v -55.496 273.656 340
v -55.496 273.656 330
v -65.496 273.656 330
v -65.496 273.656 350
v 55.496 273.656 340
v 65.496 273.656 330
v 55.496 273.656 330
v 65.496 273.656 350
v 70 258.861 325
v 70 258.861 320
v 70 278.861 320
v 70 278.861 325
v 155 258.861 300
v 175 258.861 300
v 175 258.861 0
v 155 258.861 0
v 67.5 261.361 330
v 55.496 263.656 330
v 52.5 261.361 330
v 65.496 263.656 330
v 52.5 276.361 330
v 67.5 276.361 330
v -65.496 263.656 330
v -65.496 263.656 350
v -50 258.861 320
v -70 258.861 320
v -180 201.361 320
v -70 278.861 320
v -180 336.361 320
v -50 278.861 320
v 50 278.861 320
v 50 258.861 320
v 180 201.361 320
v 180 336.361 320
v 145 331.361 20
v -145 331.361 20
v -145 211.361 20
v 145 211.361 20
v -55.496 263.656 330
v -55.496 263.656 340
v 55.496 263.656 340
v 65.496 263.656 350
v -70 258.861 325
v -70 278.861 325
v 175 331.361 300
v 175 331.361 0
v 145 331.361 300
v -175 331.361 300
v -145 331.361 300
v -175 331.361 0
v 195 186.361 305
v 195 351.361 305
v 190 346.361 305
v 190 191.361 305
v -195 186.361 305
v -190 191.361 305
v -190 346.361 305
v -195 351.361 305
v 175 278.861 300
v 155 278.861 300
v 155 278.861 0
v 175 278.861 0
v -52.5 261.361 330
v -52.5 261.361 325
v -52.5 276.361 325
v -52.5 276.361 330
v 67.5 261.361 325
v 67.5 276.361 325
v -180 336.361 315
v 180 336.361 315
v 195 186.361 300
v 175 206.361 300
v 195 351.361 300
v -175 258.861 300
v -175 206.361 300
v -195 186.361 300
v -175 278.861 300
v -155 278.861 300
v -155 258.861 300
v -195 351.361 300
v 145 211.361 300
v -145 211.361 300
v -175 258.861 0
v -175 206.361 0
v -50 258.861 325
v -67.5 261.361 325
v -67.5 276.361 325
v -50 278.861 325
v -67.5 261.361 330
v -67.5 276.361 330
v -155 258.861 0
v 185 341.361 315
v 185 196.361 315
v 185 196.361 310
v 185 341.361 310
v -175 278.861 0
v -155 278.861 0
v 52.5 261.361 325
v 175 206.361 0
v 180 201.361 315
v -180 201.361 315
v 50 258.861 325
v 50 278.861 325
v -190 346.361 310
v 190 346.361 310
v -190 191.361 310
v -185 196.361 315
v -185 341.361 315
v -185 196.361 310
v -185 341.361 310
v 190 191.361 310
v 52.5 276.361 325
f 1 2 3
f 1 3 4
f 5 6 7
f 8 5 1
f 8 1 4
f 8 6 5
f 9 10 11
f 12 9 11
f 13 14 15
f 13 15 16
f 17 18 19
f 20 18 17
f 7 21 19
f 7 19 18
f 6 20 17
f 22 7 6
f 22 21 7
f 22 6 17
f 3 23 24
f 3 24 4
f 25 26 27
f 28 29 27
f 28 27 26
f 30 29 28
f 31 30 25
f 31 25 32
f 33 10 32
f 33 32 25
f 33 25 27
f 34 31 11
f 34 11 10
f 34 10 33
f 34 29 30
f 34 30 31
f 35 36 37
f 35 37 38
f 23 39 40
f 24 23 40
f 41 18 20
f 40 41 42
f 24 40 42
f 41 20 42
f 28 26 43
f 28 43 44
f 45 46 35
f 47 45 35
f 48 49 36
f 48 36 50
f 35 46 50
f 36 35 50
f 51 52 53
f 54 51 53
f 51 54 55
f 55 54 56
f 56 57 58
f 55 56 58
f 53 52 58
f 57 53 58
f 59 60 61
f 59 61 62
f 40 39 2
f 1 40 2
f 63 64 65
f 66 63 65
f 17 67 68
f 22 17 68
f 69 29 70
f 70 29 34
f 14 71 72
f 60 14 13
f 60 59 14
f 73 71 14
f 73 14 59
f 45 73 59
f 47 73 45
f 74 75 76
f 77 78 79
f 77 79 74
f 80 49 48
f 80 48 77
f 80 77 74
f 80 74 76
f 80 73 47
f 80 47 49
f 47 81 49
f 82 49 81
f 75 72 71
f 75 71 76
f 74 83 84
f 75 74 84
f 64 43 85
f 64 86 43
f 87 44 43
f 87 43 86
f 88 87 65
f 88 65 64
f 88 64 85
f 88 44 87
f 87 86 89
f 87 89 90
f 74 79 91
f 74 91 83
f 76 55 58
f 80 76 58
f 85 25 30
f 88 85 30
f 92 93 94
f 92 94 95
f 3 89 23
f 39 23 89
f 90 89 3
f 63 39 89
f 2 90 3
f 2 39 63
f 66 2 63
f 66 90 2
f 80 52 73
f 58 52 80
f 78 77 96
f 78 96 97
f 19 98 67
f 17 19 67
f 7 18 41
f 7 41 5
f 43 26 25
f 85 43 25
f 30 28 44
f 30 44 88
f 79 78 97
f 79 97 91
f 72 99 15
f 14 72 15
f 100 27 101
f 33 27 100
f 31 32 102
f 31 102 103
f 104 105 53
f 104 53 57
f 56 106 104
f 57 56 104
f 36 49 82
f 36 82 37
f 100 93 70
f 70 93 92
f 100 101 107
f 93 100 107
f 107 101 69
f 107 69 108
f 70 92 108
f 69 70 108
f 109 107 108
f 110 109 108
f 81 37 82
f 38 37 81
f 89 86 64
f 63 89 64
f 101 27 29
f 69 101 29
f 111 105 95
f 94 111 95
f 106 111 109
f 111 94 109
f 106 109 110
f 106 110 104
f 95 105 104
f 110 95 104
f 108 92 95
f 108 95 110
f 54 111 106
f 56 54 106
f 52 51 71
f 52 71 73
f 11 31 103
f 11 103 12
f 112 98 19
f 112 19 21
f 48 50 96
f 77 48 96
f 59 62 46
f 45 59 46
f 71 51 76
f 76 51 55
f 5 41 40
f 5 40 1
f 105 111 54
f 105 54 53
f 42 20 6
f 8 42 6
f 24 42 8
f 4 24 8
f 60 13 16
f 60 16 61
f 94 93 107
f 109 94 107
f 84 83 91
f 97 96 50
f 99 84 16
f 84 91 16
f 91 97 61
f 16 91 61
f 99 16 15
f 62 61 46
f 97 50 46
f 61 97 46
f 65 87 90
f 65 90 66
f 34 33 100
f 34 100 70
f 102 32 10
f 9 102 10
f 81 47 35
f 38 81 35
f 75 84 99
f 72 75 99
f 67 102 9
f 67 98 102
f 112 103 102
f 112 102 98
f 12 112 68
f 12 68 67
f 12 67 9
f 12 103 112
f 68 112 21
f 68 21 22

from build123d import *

# Parameters (mm, degrees)
BOSS_EXTRUDE1_DEPTH = 320
SKETCH2_W           = 20
SKETCH2_H           = 20
BOSS_EXTRUDE2_DEPTH = 5
SKETCH3_W           = 15
SKETCH3_H           = 15
BOSS_EXTRUDE3_DEPTH = 5
SKETCH4_W           = 10
SKETCH4_H           = 10
BOSS_EXTRUDE4_DEPTH = 20
BOSS_EXTRUDE5_REACH = 232.496
SKETCH5_W           = 10
SKETCH5_H           = 10
SKETCH6_W           = 290
SKETCH6_H           = 280
CUT_EXTRUDE1_DEPTH  = 120
SKETCH7_W           = 360
SKETCH7_H           = 135
BOSS_EXTRUDE6_DEPTH = 5
SKETCH8_W           = 370
SKETCH8_H           = 145
BOSS_EXTRUDE7_DEPTH = 5
SKETCH9_W           = 380
SKETCH9_H           = 155
BOSS_EXTRUDE8_DEPTH = 5
SKETCH10_W          = 390
SKETCH10_H          = 165
BOSS_EXTRUDE9_DEPTH = 5


with BuildPart() as part:
    # Sketch1 → Boss-Extrude1 (new body)
    with BuildSketch(Plane.XY):
        Polygon((-175, 206.36092205), (175, 206.36092205), (175, 258.86092205), (155, 258.86092205), (155, 278.86092205), (175, 278.86092205), (175, 331.36092205), (-175, 331.36092205), (-175, 278.86092205), (-155, 278.86092205), (-155, 258.86092205), (-175, 258.86092205), align=None)
    extrude(amount=BOSS_EXTRUDE1_DEPTH)

    # Sketch2 → Boss-Extrude2 (add)
    with BuildSketch(Plane.XY.offset(320)):
        with Locations((60, 268.86092205)):
            Rectangle(SKETCH2_W, SKETCH2_H)
        with Locations((-60, 268.86092205)):
            Rectangle(SKETCH2_W, SKETCH2_H)
    extrude(amount=BOSS_EXTRUDE2_DEPTH)

    # Sketch3 → Boss-Extrude3 (add)
    with BuildSketch(Plane.XY.offset(325)):
        with Locations((60, 268.86092205)):
            Rectangle(SKETCH3_W, SKETCH3_H)
        with Locations((-60, 268.86092205)):
            Rectangle(SKETCH3_W, SKETCH3_H)
    extrude(amount=BOSS_EXTRUDE3_DEPTH)

    # Sketch4 → Boss-Extrude4 (add)
    with BuildSketch(Plane.XY.offset(330)):
        with Locations((60.496067434, 268.65644762)):
            Rectangle(SKETCH4_W, SKETCH4_H)
        with Locations((-60.496067434, 268.65644762)):
            Rectangle(SKETCH4_W, SKETCH4_H)
    extrude(amount=BOSS_EXTRUDE4_DEPTH)

    # Sketch5 → Boss-Extrude5 (add, up to next)
    with BuildSketch(Plane.ZY.offset(-55.496067434), mode=Mode.PRIVATE) as boss_extrude5_sk1:
        with Locations((345, 268.65644762)):
            Rectangle(SKETCH5_W, SKETCH5_H)
    boss_extrude5_tool1 = extrude(boss_extrude5_sk1.sketch, amount=BOSS_EXTRUDE5_REACH, mode=Mode.PRIVATE) - part.part
    add(boss_extrude5_tool1.solids().sort_by_distance((55.496067, 268.656448, 345))[0])

    # Sketch6 → Cut-Extrude1 (cut)
    with BuildSketch(Plane(origin=(0, 331.36092205, 0), x_dir=(1, 0, 0), z_dir=(0, 1, 0))):
        with Locations((0, -160)):
            Rectangle(SKETCH6_W, SKETCH6_H)
    extrude(amount=-CUT_EXTRUDE1_DEPTH, mode=Mode.SUBTRACT)

    # Sketch7 → Boss-Extrude6 (add)
    with BuildSketch(Plane.XY.offset(320)):
        with Locations((0, 268.86092205)):
            Rectangle(SKETCH7_W, SKETCH7_H)
    extrude(amount=-BOSS_EXTRUDE6_DEPTH)

    # Sketch8 → Boss-Extrude7 (add)
    with BuildSketch(Plane(origin=(0, 0, 315), x_dir=(-1, 0, 0), z_dir=(0, 0, -1))):
        with Locations((0, 268.86092205)):
            Rectangle(SKETCH8_W, SKETCH8_H)
    extrude(amount=BOSS_EXTRUDE7_DEPTH)

    # Sketch9 → Boss-Extrude8 (add)
    with BuildSketch(Plane(origin=(0, 0, 310), x_dir=(-1, 0, 0), z_dir=(0, 0, -1))):
        with Locations((0, 268.86092205)):
            Rectangle(SKETCH9_W, SKETCH9_H)
    extrude(amount=BOSS_EXTRUDE8_DEPTH)

    # Sketch10 → Boss-Extrude9 (add)
    with BuildSketch(Plane(origin=(0, 0, 305), x_dir=(-1, 0, 0), z_dir=(0, 0, -1))):
        with Locations((0, 268.86092205)):
            Rectangle(SKETCH10_W, SKETCH10_H)
    extrude(amount=BOSS_EXTRUDE9_DEPTH)


solid = part.part
